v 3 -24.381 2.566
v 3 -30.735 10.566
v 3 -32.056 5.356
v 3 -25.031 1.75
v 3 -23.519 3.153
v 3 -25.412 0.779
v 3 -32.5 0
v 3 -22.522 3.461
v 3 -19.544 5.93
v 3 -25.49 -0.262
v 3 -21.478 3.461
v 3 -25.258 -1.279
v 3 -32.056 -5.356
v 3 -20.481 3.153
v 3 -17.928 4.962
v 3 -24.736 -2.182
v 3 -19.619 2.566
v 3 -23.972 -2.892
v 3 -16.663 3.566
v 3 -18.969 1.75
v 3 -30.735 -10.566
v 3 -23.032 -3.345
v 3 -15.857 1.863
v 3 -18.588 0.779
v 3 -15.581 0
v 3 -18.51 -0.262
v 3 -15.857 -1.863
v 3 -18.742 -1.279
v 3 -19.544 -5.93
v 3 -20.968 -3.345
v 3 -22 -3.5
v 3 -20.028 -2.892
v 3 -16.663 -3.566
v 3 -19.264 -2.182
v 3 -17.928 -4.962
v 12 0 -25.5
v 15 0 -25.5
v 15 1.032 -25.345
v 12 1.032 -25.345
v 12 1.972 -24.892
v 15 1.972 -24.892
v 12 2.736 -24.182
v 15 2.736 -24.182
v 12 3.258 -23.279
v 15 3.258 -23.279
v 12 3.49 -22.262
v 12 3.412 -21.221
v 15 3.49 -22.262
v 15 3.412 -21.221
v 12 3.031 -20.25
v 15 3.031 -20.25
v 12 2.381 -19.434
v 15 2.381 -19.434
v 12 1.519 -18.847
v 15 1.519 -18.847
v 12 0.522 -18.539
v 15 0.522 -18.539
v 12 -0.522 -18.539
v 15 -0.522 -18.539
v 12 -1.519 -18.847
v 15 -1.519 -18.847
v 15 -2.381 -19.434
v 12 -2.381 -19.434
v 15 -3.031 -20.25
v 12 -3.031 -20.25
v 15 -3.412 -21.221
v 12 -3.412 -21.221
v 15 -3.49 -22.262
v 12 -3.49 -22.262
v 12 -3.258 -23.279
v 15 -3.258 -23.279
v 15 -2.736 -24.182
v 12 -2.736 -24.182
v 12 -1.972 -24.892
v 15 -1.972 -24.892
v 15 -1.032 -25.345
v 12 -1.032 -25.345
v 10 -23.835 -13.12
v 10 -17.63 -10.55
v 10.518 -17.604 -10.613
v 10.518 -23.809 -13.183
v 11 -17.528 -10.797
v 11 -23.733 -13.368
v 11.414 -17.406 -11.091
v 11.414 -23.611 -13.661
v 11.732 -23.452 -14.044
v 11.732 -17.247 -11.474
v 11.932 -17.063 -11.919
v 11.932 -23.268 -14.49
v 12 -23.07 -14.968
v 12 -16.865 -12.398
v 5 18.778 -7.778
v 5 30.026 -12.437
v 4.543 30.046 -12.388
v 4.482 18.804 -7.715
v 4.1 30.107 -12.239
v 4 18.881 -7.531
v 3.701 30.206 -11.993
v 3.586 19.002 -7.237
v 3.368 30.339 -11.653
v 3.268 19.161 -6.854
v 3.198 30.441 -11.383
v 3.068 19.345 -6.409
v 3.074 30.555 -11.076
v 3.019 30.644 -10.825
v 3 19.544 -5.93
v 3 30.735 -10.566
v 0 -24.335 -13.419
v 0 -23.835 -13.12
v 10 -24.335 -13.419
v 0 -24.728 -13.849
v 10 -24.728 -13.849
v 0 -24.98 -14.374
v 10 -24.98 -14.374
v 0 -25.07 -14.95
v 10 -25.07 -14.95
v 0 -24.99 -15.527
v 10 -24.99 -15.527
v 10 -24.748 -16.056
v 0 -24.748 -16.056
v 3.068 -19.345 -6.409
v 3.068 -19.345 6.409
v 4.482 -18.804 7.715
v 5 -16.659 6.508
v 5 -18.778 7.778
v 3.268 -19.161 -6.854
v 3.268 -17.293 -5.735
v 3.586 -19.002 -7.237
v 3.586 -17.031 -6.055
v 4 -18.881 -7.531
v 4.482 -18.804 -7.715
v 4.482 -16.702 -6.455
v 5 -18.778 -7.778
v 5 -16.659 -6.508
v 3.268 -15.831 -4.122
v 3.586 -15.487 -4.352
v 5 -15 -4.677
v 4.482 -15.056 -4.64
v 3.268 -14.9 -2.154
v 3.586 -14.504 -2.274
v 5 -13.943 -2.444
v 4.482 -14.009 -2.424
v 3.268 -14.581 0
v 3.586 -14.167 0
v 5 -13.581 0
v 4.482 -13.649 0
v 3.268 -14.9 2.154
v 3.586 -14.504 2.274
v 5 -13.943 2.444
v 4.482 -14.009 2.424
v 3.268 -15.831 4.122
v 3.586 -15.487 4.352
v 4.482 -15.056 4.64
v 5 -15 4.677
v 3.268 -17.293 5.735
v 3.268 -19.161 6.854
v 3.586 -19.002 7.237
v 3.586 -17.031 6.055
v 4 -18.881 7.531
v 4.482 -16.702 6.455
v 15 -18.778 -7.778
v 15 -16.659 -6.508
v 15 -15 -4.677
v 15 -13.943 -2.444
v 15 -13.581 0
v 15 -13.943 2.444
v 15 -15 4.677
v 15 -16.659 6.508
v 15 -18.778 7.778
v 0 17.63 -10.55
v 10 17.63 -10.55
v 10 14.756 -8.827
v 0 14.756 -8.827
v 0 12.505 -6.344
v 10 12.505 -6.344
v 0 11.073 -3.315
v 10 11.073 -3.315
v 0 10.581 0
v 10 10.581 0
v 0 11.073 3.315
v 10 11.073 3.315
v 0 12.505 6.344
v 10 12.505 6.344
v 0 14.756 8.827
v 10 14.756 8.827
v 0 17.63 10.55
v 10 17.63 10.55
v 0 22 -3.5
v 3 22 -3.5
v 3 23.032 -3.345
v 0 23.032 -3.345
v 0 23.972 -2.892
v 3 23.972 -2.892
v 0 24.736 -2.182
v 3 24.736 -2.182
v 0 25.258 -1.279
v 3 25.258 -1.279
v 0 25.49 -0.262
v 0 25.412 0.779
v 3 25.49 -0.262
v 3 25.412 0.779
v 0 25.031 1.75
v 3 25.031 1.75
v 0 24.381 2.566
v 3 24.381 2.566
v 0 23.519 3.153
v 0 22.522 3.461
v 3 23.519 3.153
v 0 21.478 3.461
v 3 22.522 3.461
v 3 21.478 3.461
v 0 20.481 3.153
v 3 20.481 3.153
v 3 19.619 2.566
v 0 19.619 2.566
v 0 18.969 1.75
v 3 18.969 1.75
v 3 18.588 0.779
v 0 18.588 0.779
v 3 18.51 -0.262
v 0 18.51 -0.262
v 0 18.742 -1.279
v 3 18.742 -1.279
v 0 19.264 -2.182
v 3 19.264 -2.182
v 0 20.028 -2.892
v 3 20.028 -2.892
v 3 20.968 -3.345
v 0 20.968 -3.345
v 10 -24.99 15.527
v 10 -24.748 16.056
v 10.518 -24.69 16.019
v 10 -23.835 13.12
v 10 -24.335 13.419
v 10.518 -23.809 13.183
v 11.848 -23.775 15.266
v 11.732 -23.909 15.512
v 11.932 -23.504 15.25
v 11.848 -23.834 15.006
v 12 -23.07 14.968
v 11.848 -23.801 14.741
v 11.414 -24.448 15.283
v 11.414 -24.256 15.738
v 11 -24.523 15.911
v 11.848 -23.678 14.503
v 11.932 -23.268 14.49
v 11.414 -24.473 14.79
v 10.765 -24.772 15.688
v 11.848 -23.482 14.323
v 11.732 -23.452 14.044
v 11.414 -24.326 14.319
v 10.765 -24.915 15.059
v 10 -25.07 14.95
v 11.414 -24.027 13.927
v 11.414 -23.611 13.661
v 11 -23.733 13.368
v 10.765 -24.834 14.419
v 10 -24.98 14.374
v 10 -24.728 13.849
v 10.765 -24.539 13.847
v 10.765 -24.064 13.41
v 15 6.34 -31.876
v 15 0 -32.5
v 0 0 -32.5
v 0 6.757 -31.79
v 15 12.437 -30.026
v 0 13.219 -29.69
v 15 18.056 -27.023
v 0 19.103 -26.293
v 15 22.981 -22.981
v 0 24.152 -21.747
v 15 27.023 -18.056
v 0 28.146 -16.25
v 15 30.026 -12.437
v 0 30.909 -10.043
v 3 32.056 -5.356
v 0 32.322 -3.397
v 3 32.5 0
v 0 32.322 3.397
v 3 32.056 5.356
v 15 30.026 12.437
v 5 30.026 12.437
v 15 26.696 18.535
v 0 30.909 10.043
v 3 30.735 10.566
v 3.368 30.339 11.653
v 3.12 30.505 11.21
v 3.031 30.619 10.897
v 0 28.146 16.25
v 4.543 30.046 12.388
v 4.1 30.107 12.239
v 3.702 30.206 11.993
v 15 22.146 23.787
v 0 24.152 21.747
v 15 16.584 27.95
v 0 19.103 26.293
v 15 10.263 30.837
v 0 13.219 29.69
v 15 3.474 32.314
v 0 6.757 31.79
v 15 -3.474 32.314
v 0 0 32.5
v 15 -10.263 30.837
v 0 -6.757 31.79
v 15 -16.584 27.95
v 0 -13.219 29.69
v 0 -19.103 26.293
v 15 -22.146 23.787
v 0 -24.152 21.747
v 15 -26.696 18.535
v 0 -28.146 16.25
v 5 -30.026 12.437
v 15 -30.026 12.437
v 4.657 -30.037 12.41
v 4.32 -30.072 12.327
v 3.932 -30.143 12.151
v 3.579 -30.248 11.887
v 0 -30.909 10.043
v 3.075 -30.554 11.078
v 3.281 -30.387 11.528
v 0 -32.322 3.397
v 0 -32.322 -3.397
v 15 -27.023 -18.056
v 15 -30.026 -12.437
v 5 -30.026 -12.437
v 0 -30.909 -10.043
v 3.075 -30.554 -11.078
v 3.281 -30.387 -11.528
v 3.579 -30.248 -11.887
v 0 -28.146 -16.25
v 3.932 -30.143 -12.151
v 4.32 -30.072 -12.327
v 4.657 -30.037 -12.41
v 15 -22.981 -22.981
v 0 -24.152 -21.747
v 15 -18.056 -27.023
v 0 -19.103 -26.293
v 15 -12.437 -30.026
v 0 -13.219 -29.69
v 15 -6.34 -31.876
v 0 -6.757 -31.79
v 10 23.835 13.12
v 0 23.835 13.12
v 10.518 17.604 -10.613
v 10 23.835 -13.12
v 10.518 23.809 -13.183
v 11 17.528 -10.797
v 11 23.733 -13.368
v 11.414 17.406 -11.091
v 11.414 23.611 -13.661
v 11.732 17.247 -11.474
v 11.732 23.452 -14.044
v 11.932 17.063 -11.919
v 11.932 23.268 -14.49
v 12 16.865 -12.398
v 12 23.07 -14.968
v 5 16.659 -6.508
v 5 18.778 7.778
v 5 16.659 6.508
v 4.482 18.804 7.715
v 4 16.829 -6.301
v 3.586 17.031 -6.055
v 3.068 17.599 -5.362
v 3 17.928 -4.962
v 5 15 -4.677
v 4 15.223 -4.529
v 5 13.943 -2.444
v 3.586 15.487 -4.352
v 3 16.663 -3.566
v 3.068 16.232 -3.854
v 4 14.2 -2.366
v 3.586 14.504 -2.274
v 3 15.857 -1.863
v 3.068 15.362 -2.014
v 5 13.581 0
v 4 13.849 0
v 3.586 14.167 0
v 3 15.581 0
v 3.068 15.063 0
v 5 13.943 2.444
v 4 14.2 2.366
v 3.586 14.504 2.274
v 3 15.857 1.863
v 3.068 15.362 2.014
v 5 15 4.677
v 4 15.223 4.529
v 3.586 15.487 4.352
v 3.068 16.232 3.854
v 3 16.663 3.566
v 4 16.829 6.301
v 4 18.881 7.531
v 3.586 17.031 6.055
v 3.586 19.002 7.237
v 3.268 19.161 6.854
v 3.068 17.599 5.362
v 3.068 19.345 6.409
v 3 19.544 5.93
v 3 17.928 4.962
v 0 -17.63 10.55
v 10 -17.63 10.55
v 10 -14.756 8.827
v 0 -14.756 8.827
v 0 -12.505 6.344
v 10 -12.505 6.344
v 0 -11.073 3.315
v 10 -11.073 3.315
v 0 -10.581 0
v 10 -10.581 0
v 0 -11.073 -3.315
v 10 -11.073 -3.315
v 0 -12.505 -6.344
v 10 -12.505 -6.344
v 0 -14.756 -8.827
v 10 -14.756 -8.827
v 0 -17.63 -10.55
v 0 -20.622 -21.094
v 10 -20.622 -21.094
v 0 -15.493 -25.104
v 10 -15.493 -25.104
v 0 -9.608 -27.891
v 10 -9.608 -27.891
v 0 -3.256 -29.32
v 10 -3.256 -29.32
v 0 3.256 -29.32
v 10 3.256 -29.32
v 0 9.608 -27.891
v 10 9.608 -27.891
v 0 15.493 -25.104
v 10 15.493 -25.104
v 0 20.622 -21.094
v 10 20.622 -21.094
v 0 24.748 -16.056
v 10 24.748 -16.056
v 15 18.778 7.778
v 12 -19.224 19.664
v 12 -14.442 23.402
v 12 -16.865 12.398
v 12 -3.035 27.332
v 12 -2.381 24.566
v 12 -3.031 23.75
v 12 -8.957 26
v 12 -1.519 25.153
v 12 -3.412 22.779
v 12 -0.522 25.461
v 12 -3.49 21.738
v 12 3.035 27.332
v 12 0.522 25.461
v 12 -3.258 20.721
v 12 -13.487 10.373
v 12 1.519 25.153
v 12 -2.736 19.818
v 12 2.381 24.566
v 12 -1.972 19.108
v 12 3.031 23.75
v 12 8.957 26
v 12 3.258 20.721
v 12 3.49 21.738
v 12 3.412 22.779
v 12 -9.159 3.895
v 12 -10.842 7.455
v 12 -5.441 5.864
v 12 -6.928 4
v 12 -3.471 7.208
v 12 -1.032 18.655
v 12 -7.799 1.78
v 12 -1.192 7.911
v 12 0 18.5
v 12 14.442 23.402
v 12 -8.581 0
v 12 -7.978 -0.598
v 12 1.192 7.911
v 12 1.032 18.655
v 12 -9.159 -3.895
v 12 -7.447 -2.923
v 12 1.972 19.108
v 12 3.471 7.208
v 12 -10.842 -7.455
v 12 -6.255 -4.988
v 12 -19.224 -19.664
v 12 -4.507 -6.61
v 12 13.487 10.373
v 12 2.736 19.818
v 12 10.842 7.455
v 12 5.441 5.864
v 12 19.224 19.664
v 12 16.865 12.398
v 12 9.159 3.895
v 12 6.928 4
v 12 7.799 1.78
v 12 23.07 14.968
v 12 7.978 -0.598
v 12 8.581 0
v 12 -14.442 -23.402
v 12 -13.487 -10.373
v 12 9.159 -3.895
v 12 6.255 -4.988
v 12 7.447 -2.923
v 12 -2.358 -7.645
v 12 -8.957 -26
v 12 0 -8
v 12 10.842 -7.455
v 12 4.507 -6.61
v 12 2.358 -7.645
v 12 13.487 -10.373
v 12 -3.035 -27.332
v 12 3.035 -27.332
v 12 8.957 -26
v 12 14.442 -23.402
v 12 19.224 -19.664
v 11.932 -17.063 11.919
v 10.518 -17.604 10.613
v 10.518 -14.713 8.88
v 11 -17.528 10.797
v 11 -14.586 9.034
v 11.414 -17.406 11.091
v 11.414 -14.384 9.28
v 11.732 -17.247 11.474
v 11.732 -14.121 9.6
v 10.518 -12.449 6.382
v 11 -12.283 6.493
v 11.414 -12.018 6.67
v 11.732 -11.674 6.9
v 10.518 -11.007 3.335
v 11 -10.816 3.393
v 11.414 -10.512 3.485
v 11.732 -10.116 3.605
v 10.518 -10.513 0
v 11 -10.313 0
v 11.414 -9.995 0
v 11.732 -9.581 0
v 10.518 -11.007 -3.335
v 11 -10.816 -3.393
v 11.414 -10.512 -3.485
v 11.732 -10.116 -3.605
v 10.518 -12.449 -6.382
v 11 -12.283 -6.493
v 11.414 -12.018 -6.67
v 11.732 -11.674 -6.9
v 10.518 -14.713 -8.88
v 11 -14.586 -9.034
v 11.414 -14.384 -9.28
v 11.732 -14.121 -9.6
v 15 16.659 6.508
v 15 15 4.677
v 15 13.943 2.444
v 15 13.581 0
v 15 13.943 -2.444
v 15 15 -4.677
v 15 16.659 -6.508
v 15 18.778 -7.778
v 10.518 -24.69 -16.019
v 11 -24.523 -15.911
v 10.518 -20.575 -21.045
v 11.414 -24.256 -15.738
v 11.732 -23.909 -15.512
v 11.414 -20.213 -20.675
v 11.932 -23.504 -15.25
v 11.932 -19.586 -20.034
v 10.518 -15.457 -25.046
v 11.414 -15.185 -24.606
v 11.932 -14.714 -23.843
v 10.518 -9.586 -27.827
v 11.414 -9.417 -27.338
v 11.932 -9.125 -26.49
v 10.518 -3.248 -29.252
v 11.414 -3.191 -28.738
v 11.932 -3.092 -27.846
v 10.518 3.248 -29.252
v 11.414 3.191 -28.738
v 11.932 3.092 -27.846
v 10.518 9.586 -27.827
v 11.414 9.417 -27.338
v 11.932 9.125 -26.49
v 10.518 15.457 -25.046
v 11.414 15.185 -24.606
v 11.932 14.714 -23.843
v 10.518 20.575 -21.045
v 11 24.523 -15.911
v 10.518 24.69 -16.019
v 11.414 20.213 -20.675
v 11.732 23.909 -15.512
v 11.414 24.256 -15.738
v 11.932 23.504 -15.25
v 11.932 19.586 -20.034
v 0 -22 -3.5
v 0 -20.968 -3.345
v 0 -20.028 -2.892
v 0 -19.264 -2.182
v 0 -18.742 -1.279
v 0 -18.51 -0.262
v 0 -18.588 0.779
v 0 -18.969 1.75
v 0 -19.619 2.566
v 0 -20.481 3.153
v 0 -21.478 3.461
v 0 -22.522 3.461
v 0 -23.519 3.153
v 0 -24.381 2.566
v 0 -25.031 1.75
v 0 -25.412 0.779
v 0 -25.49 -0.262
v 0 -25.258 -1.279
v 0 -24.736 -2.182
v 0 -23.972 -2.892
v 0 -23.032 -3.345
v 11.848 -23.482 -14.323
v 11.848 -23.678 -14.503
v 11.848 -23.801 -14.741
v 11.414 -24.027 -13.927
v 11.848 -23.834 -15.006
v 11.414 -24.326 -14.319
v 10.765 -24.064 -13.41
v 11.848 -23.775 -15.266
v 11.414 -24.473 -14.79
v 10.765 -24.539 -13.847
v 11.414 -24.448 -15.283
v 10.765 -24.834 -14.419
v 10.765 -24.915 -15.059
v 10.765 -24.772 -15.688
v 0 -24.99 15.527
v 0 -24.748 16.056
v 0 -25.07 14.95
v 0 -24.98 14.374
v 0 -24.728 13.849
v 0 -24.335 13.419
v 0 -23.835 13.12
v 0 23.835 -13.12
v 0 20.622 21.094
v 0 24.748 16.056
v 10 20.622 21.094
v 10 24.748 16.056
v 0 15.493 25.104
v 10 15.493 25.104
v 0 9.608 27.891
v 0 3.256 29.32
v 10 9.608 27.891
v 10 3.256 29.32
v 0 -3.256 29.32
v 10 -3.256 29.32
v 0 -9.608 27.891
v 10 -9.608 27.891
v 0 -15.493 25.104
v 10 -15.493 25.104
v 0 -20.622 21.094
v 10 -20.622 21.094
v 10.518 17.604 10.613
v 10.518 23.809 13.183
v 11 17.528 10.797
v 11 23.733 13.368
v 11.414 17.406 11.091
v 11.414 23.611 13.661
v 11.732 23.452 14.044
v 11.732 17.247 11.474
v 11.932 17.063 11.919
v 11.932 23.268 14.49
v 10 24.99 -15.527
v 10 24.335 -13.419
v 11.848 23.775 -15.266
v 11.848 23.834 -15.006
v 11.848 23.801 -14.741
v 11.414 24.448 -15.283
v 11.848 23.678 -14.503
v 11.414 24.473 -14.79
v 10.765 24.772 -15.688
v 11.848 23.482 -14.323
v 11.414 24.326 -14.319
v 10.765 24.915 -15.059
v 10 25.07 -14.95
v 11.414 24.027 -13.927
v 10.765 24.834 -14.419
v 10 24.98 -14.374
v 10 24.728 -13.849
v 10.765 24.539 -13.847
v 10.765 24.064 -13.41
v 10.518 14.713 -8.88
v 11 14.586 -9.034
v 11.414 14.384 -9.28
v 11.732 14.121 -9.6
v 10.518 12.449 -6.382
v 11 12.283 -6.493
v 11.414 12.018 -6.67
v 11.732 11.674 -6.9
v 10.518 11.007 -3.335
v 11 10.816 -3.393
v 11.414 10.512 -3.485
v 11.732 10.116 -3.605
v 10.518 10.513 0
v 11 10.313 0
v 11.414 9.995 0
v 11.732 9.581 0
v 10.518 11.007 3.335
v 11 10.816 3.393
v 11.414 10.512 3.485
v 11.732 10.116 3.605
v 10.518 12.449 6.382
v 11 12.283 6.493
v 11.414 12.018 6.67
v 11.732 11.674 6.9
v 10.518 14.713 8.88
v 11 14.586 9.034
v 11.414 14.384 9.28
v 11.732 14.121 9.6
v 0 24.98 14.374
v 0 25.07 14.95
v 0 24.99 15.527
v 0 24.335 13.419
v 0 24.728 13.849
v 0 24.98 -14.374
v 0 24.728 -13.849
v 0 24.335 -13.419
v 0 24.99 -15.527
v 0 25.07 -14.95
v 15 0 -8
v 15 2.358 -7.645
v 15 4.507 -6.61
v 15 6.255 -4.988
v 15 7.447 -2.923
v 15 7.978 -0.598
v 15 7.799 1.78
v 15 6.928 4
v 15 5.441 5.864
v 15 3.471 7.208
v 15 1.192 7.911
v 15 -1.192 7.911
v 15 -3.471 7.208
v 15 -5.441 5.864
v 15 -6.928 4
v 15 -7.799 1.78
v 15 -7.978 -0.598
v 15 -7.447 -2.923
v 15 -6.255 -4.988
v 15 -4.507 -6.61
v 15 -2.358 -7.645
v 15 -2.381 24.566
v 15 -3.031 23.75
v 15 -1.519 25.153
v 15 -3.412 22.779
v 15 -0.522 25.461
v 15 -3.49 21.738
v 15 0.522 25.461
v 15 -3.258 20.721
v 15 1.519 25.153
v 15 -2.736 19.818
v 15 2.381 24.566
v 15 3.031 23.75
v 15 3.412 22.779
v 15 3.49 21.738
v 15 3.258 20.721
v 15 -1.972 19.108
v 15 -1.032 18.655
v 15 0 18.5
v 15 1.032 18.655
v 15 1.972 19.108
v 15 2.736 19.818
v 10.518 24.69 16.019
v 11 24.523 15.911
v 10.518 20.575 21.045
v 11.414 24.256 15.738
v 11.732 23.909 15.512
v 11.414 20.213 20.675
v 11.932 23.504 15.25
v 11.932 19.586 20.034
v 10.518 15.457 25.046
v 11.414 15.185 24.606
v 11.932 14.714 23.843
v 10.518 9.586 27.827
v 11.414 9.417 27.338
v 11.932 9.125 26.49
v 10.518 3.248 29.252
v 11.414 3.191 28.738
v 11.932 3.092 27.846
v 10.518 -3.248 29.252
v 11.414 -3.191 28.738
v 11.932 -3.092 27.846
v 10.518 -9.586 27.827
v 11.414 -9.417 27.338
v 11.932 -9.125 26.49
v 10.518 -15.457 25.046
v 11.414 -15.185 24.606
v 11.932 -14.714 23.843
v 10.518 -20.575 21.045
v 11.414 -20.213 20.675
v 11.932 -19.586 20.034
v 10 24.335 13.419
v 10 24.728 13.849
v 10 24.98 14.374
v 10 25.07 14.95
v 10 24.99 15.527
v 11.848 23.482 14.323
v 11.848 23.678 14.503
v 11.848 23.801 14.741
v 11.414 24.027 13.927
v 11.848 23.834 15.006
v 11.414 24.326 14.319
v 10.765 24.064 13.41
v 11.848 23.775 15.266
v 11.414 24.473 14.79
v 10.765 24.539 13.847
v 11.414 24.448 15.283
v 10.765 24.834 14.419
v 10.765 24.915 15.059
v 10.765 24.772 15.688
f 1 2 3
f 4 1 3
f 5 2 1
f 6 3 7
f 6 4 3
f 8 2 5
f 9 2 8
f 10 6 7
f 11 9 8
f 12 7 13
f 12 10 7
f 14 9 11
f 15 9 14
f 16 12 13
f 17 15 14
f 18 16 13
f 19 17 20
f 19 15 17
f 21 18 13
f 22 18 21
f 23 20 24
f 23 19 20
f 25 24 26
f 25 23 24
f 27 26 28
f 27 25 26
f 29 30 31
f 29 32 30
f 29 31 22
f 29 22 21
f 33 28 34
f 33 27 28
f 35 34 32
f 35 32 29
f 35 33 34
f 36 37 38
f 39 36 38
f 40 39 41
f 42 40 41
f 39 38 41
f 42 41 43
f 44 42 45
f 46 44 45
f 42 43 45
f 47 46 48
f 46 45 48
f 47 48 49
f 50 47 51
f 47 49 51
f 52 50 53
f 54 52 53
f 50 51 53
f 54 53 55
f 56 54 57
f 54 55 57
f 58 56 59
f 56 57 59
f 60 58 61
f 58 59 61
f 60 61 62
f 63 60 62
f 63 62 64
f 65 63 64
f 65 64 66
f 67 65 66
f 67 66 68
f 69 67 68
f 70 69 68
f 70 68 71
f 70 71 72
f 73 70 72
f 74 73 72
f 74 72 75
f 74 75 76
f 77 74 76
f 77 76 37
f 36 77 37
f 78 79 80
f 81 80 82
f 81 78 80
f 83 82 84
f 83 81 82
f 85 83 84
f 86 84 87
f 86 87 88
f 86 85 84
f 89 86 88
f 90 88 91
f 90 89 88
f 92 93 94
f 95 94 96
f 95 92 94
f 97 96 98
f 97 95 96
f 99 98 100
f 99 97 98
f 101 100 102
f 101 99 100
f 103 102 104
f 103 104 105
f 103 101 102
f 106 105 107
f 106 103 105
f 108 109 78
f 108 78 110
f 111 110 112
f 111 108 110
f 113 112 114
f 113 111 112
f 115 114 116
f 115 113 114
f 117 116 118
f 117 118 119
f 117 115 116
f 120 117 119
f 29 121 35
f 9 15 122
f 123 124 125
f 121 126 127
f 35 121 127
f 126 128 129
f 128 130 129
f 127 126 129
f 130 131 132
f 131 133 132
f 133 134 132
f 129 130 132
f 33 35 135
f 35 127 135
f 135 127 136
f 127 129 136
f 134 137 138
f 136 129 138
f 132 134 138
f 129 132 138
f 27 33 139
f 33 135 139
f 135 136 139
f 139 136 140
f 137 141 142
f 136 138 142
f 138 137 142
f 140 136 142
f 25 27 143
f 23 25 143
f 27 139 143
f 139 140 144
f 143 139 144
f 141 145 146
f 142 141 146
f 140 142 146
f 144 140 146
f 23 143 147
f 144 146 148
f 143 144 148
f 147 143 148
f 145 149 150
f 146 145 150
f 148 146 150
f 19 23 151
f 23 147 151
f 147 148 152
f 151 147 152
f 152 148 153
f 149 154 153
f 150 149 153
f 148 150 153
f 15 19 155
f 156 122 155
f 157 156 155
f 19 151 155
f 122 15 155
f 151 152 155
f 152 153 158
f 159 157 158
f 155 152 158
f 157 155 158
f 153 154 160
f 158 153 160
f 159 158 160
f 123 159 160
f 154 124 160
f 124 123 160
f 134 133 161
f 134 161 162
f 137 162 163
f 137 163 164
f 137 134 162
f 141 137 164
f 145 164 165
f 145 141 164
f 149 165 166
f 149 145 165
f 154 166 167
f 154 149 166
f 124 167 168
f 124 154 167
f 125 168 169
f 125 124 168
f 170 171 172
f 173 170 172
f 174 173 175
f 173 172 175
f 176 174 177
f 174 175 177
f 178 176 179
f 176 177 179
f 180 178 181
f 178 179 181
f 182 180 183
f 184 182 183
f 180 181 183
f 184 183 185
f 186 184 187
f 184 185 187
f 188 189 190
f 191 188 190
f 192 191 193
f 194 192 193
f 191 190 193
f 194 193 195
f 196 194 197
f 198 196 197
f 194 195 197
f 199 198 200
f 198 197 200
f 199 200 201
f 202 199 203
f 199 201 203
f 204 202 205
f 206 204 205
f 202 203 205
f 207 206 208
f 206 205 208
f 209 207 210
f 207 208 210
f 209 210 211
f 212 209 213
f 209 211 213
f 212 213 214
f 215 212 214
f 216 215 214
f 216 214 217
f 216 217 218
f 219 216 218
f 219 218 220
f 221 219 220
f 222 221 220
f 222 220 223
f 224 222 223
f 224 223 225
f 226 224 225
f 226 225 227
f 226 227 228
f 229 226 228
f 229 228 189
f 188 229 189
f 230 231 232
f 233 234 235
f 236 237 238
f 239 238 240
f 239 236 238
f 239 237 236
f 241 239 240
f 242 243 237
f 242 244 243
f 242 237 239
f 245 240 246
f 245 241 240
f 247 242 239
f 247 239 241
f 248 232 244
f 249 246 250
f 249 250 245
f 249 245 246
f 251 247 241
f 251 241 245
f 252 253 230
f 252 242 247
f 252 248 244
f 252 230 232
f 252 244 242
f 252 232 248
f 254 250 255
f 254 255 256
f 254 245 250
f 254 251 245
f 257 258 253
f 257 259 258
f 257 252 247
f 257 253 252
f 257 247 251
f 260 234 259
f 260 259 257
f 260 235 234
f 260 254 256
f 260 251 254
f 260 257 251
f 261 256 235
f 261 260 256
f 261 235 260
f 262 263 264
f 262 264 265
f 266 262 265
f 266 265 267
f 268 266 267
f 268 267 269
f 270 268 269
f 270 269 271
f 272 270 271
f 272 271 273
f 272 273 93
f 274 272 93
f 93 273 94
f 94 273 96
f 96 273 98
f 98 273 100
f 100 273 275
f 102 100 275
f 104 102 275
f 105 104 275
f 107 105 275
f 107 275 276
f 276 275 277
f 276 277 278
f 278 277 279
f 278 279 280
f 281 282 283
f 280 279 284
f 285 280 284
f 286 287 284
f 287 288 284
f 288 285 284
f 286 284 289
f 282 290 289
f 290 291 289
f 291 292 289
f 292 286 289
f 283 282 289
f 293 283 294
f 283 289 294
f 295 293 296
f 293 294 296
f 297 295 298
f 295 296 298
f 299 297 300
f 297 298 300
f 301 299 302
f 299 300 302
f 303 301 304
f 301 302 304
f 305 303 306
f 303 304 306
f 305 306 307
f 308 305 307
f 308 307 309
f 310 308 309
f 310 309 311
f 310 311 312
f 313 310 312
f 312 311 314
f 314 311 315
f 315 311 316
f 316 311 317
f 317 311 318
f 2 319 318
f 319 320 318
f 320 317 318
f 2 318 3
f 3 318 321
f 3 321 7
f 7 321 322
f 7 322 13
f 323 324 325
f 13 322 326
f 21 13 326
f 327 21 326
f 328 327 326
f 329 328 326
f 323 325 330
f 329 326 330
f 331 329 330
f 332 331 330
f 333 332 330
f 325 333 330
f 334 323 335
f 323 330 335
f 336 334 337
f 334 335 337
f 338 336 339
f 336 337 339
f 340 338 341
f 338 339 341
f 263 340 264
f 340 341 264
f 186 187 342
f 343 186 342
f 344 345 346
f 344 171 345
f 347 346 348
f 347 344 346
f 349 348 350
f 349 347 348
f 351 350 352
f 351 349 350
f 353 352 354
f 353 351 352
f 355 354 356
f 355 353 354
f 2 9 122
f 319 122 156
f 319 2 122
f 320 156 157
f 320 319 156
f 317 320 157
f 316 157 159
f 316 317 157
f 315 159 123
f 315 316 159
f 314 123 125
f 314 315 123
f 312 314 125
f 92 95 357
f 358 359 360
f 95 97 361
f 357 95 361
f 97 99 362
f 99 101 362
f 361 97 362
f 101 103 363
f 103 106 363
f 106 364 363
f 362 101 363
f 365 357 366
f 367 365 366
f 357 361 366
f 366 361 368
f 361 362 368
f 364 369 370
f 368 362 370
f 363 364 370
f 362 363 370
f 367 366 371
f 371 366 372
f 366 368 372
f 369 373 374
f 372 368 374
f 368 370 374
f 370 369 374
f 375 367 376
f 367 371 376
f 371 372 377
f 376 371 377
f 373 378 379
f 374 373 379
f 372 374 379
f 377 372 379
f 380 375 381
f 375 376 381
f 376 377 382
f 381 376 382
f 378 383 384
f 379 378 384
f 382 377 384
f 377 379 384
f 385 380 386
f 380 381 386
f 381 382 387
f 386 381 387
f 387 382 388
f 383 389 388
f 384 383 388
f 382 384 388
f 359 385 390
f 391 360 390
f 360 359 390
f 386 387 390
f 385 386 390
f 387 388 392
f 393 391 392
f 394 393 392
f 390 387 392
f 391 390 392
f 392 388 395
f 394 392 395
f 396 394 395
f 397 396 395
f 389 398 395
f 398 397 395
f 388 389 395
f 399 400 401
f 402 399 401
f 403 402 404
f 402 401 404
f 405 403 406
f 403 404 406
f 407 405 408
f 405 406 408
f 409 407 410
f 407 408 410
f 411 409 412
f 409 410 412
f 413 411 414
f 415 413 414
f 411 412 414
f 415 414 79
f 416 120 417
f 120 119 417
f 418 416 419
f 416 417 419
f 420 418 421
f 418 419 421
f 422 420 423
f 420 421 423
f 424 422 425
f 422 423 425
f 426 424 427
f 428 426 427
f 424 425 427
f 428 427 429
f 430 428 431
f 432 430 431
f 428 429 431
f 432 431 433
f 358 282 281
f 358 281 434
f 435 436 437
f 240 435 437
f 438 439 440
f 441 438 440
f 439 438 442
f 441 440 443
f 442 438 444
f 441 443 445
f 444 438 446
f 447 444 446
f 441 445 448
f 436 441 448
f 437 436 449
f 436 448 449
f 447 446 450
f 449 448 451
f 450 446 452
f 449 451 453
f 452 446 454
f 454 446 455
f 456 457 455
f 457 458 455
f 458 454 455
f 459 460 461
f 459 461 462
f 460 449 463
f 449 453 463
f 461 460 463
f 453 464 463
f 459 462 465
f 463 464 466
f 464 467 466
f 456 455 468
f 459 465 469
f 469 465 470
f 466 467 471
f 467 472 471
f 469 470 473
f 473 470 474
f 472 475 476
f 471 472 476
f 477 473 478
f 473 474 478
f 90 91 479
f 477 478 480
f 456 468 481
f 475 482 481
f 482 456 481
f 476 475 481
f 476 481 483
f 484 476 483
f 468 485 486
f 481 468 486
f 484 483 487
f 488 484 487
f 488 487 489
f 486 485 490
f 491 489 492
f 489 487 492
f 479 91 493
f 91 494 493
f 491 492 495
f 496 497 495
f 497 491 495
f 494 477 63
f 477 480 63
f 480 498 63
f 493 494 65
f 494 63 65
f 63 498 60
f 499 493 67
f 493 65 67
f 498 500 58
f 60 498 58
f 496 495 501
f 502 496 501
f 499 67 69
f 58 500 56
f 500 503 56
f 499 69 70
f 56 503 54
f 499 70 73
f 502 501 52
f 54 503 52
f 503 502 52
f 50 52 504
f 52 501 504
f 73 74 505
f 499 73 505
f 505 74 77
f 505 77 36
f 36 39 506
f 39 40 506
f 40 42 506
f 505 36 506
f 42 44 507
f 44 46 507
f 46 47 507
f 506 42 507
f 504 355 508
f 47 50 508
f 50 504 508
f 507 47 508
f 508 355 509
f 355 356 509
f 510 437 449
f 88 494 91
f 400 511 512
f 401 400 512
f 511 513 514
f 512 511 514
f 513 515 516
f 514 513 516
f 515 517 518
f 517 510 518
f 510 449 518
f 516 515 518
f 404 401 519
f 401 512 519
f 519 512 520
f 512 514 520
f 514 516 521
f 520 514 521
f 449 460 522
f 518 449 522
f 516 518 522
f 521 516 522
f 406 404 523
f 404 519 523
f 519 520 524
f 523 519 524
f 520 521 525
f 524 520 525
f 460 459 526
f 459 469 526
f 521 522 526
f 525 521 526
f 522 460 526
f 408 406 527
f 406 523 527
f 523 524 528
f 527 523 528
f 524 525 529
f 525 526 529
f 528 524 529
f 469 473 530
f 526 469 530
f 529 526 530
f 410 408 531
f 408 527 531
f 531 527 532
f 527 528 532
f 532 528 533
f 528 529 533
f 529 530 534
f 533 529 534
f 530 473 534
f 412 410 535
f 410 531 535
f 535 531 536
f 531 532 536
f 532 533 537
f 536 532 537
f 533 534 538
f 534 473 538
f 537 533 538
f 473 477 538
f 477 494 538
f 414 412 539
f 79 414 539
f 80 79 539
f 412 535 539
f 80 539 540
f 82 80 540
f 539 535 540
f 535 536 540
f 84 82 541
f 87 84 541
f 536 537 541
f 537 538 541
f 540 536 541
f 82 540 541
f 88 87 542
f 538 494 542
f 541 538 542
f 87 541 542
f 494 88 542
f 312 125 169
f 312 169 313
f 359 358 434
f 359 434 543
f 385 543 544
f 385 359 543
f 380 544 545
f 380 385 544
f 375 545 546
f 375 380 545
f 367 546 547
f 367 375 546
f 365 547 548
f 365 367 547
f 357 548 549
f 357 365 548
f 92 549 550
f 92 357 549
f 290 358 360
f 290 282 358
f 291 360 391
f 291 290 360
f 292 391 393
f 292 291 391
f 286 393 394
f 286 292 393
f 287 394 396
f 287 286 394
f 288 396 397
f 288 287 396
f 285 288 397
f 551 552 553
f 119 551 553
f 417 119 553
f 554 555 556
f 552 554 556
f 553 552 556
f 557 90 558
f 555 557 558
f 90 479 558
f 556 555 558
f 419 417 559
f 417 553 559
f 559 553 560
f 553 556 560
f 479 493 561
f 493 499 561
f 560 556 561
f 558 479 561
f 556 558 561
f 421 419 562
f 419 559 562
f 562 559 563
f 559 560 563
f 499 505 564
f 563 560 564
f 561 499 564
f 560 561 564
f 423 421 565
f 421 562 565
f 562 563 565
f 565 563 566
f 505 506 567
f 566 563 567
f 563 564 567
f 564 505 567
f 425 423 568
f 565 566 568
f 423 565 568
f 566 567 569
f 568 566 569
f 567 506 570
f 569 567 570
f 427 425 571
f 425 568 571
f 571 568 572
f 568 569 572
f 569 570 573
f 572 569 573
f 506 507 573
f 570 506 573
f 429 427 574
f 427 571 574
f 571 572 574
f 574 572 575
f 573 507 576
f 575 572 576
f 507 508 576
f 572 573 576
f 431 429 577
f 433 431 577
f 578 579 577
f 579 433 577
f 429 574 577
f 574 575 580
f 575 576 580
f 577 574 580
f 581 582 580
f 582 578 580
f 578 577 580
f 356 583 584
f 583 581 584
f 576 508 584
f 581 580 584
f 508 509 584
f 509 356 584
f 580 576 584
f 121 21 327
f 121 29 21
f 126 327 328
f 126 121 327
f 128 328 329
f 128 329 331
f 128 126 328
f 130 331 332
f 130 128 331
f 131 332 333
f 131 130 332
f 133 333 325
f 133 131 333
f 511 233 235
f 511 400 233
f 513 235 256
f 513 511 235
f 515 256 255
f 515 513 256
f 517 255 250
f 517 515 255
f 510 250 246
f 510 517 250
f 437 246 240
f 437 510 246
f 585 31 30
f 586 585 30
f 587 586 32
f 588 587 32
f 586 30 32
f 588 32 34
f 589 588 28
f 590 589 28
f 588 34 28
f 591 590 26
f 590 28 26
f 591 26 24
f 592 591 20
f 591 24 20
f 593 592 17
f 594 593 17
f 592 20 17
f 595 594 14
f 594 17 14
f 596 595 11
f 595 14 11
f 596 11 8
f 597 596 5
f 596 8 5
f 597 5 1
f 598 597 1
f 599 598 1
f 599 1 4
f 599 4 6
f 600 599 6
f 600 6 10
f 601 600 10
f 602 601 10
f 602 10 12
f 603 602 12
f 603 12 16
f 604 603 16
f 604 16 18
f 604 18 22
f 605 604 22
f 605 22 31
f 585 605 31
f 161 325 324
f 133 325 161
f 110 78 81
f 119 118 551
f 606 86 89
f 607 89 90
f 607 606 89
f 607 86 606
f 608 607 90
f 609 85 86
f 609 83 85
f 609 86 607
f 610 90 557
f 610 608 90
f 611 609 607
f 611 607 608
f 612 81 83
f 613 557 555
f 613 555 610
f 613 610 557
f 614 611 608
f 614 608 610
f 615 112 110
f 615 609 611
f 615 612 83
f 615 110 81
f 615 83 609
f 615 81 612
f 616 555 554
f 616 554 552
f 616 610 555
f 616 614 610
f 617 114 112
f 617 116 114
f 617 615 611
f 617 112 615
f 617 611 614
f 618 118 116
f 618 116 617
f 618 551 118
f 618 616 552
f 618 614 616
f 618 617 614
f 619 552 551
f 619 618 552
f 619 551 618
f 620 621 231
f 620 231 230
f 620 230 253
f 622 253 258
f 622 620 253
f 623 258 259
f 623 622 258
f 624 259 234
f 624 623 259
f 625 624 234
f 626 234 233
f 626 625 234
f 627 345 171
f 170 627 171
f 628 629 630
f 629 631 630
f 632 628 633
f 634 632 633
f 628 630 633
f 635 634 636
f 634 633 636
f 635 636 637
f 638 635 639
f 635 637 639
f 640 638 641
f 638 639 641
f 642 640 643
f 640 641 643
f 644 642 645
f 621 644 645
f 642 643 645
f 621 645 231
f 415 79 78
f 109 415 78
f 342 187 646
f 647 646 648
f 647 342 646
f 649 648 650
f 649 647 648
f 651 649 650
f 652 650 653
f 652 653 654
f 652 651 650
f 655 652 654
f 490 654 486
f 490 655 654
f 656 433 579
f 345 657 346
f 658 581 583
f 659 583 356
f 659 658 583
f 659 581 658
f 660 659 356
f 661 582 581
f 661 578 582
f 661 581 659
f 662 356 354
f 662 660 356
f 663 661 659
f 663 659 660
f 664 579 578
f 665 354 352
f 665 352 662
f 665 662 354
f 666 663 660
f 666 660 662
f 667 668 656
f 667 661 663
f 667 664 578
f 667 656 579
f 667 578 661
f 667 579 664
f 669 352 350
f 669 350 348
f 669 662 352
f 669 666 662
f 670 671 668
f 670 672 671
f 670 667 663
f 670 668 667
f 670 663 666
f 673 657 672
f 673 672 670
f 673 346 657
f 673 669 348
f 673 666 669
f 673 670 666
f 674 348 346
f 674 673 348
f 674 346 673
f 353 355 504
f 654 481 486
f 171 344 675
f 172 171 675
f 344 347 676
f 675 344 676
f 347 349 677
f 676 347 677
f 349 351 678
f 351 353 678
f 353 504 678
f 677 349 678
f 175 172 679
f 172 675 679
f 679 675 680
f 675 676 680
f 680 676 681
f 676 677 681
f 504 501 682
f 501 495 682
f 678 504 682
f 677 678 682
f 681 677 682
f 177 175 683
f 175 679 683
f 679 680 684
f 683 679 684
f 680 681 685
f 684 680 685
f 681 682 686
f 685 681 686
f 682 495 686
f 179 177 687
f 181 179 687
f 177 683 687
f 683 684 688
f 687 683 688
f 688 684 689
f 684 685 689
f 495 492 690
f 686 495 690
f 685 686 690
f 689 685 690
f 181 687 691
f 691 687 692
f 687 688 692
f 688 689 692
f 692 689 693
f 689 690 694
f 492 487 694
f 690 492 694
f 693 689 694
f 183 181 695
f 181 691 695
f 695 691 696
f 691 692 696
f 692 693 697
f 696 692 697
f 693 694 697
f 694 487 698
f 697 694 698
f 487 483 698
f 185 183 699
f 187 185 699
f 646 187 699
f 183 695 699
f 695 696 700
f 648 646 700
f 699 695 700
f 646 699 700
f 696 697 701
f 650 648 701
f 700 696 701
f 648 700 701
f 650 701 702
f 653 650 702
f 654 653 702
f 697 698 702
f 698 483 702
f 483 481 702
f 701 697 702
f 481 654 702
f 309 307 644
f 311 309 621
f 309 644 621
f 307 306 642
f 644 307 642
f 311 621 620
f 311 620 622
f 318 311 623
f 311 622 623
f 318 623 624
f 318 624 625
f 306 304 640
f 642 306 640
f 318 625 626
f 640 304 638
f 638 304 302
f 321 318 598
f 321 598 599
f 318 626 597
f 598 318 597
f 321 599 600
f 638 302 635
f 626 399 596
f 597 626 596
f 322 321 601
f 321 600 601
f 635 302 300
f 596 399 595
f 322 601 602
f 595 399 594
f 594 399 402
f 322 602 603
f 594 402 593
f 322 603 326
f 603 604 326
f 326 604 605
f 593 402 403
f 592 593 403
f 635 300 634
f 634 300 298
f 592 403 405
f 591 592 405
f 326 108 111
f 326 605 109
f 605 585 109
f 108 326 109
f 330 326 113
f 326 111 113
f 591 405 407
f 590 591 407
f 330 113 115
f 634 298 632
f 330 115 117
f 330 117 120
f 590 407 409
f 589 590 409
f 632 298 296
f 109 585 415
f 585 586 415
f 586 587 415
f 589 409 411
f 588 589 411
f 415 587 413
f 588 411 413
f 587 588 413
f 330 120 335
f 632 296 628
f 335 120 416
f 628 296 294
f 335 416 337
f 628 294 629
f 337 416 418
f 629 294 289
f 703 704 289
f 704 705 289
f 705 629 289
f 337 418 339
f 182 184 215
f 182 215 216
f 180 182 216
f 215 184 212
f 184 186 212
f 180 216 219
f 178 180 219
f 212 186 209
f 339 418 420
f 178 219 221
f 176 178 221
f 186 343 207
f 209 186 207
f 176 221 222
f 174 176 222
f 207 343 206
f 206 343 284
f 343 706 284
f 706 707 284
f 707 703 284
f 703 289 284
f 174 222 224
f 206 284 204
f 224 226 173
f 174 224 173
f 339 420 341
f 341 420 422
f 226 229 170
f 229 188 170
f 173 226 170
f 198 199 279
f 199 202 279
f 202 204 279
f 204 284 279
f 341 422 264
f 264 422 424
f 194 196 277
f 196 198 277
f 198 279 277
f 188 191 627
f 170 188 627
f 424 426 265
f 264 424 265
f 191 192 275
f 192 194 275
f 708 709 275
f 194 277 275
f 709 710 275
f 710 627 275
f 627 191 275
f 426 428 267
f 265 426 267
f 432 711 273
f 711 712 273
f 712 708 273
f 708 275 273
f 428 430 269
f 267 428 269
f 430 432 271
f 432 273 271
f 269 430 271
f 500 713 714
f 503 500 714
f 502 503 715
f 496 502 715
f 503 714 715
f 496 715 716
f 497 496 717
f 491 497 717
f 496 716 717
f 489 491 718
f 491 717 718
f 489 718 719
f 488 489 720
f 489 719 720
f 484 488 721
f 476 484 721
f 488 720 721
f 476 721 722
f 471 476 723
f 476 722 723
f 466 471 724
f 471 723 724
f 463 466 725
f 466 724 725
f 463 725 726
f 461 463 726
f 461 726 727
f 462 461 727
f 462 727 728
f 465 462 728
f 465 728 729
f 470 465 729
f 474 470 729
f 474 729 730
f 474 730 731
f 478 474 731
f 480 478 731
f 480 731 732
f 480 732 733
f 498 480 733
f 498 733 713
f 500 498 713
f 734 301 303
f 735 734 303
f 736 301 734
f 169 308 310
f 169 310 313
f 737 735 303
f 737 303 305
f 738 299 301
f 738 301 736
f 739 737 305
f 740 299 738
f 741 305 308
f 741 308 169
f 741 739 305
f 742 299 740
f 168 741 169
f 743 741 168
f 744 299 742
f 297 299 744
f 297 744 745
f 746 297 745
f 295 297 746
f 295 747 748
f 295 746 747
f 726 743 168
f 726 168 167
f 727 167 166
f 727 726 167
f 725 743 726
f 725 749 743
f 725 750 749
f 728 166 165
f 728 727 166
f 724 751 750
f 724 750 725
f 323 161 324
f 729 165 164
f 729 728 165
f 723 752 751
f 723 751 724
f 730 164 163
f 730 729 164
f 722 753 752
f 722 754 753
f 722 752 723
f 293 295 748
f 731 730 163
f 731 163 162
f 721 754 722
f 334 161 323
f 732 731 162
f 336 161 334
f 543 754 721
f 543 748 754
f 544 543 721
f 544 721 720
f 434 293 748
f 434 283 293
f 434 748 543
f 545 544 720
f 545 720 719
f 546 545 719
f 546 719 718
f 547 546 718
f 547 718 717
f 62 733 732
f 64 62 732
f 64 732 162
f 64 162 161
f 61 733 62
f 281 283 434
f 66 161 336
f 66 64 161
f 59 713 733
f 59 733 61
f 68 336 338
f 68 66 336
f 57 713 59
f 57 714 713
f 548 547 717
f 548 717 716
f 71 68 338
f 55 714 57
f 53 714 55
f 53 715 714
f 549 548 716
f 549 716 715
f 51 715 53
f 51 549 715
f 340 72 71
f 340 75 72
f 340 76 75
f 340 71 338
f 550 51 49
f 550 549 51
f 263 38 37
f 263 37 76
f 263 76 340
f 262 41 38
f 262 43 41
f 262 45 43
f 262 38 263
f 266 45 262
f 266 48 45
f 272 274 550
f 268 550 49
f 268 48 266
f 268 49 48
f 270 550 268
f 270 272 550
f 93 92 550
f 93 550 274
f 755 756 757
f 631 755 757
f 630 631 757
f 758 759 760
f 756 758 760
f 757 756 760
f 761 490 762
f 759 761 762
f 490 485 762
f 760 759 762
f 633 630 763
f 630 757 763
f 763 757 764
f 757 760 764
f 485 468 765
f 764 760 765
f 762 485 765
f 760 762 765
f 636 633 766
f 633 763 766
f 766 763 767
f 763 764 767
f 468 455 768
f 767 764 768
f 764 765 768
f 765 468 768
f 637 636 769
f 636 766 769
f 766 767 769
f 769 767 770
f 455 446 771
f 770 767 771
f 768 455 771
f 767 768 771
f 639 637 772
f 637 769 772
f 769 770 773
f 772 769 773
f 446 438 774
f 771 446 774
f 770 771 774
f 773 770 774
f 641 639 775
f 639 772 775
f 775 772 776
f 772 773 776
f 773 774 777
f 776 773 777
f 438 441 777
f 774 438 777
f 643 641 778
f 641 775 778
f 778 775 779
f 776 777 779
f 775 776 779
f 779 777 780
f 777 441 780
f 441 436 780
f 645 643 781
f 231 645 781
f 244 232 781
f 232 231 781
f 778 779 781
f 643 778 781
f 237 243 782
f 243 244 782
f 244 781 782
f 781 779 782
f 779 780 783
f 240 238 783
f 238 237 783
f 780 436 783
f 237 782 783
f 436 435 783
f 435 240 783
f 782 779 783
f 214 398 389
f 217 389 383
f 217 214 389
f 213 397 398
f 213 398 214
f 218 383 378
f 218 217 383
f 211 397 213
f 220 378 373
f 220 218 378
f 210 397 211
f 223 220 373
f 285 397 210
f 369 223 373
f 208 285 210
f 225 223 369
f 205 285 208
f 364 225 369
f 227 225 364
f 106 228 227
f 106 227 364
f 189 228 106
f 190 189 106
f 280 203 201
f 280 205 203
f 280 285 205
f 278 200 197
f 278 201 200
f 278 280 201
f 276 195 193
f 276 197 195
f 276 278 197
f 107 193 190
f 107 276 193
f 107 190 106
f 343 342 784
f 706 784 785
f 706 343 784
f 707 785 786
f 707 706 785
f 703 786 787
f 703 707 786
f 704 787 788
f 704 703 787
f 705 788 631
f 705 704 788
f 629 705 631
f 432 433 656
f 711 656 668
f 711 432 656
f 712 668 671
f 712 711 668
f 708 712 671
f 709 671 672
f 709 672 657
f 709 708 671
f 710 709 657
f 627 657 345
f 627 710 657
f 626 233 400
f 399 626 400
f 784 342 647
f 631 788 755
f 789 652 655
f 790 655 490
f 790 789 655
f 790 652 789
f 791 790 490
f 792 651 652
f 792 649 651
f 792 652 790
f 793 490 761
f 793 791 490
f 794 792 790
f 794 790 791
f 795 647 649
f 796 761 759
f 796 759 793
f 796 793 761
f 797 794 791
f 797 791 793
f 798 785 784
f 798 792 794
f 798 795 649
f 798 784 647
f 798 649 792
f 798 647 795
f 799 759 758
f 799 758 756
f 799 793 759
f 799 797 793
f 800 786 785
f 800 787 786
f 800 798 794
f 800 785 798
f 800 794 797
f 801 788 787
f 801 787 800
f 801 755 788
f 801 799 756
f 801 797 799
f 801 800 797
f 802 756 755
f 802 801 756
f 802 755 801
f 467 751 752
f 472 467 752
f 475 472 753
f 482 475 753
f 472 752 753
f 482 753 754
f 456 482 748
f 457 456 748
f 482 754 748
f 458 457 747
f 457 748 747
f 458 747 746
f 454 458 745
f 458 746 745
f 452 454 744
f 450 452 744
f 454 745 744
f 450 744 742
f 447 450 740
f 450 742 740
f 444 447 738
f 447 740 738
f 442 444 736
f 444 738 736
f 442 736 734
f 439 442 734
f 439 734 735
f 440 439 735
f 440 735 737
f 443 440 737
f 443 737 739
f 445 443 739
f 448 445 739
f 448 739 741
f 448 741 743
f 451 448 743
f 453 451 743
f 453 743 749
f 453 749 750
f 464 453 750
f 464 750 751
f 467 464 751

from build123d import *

# Parameters (mm, degrees)
SKETCH1_R           = 32.5
BOSS_EXTRUDE1_DEPTH = 15
CUT_EXTRUDE1_START  = -12
SKETCH2_R           = 3.4999999999999996
CUT_EXTRUDE1_DEPTH  = 12
SKETCH2_3_R         = 3.4999999999999996
SKETCH2_3_R_2       = 3.5
SKETCH2_3_R_3       = 8
CUT_EXTRUDE2_DEPTH  = 49.34769901453429
CUT_EXTRUDE3_START  = -3
SKETCH2_4_R         = 3.5
SKETCH2_4_R_2       = 8
CUT_EXTRUDE3_DEPTH  = 12
FILLET1_R           = 2
FILLET2_R           = 2


with BuildPart() as part:
    # Sketch1 → Boss-Extrude1 (new body)
    with BuildSketch(Plane(origin=(0, 0, 0), x_dir=(0, 0, -1), z_dir=(1, 0, 0))):
        Circle(SKETCH1_R)
    extrude(amount=BOSS_EXTRUDE1_DEPTH)

    # Sketch2 → Cut-Extrude1 (cut)
    # profile 1 of 4: a face of its own
    with BuildSketch(Plane(origin=(15, 0, 0), x_dir=(0, 0, -1), z_dir=(1, 0, 0)).offset(CUT_EXTRUDE1_START)):
        with BuildLine():
            ThreePointArc((12.437211551865326, 30.026084806616858), (1.99e-15, 32.5), (-12.43721155186533, 30.026084806616854))
            Line((-12.437211551865326, 30.02608480661686), (-11.289161254770068, 27.254446209083))
            ThreePointArc((-11.289161254770706, 27.254446209082737), (-1.129e-14, 29.500000000000007), (11.28916125477069, 27.254446209082744))
            Line((11.289161254770068, 27.254446209083), (12.437211551865326, 30.02608480661686))
        make_face()
    # profile 2 of 4: a face of its own
    with BuildSketch(Plane(origin=(15, 0, 0), x_dir=(0, 0, -1), z_dir=(1, 0, 0)).offset(CUT_EXTRUDE1_START)):
        with BuildLine():
            ThreePointArc((11.28916125477069, 27.254446209082744), (-1.129e-14, 29.500000000000007), (-11.289161254770706, 27.254446209082737))
            Line((-11.289161254770068, 27.254446209083), (-7.778174593051978, 18.778174593052064))
            ThreePointArc((-7.778174593051979, 18.778174593052064), (4.4e-16, 13.580964487968082), (7.778174593051979, 18.778174593052064))
            Line((7.778174593051979, 18.778174593052064), (11.289161254770068, 27.254446209083))
        make_face()
        with Locations((0, 22)):
            Circle(SKETCH2_R, mode=Mode.SUBTRACT)
    # profile 3 of 4: a face of its own
    with BuildSketch(Plane(origin=(15, 0, 0), x_dir=(0, 0, -1), z_dir=(1, 0, 0)).offset(CUT_EXTRUDE1_START)):
        with BuildLine():
            Line((-7.778174593051979, -18.778174593052064), (-11.289161254770068, -27.254446209083))
            ThreePointArc((-11.2891612547707, -27.25444620908274), (-5.42e-15, -29.500000000000007), (11.28916125477069, -27.254446209082744))
            Line((11.289161254770068, -27.254446209083), (7.778174593051979, -18.778174593052064))
            ThreePointArc((7.778174593051979, -18.778174593052064), (4.4e-16, -13.580964487968082), (-7.778174593051979, -18.778174593052064))
        make_face()
        with Locations((-1.5363e-13, -22)):
            Circle(SKETCH2_R, mode=Mode.SUBTRACT)
    # profile 4 of 4: a face of its own
    with BuildSketch(Plane(origin=(15, 0, 0), x_dir=(0, 0, -1), z_dir=(1, 0, 0)).offset(CUT_EXTRUDE1_START)):
        with BuildLine():
            Line((-11.289161254770068, -27.254446209083), (-12.437211551865326, -30.02608480661686))
            ThreePointArc((-12.43721155186533, -30.026084806616854), (-5.97e-15, -32.5), (12.43721155186532, -30.02608480661686))
            Line((12.437211551865326, -30.02608480661686), (11.289161254770068, -27.254446209083))
            ThreePointArc((11.28916125477069, -27.254446209082744), (-5.42e-15, -29.500000000000007), (-11.2891612547707, -27.25444620908274))
        make_face()
    extrude(amount=CUT_EXTRUDE1_DEPTH, mode=Mode.SUBTRACT)

    # Sketch2<3> → Cut-Extrude2 (cut, through all)
    with BuildSketch(Plane(origin=(15, 0, 0), x_dir=(0, 0, -1), z_dir=(1, 0, 0))):
        with Locations((0, 22)):
            Circle(SKETCH2_3_R)
        with Locations((-1.5363e-13, -22)):
            Circle(SKETCH2_3_R)
        with Locations((-21.999999999999996, 2.3044e-13)):
            Circle(SKETCH2_3_R_2)
        with Locations((22, -7.681e-14)):
            Circle(SKETCH2_3_R_2)
        Circle(SKETCH2_3_R_3)
    extrude(amount=-CUT_EXTRUDE2_DEPTH, mode=Mode.SUBTRACT)

    # Sketch2<4> → Cut-Extrude3 (cut)
    with BuildSketch(Plane(origin=(15, 0, 0), x_dir=(0, 0, -1), z_dir=(1, 0, 0)).offset(CUT_EXTRUDE3_START)):
        with BuildLine():
            Line((-10.549813190585843, 17.630124295956804), (-14.002272700359098, 25.96509886799544))
            ThreePointArc((-14.002272700359109, 25.965098867995447), (-29.500000000000007, 3.61e-15), (-14.002272700359114, -25.965098867995444))
            Line((-14.0022727003591, -25.96509886799545), (-10.549813190585835, -17.630124295956804))
            ThreePointArc((-10.549813190585837, -17.630124295956804), (1.78e-15, -10.580964487968227), (10.549813190585844, -17.6301242959568))
            Line((10.549813190585843, -17.6301242959568), (14.0022727003591, -25.96509886799545))
            ThreePointArc((14.002272700359107, -25.965098867995447), (25.33097949804344, -15.119241967430227), (29.500000000000007, -7.23e-15))
            ThreePointArc((29.500000000000007, 0), (25.33097949804344, 15.119241967430227), (14.0022727003591, 25.96509886799545))
            Line((14.002272700359098, 25.96509886799544), (10.549813190585843, 17.630124295956804))
            ThreePointArc((10.549813190585843, 17.6301242959568), (-1.78e-15, 10.58096448796808), (-10.549813190585843, 17.630124295956804))
        make_face()
        with Locations((22, -7.681e-14)):
            Circle(SKETCH2_4_R, mode=Mode.SUBTRACT)
        with Locations((-21.999999999999996, 2.3044e-13)):
            Circle(SKETCH2_4_R, mode=Mode.SUBTRACT)
        Circle(SKETCH2_4_R_2, mode=Mode.SUBTRACT)
    extrude(amount=-CUT_EXTRUDE3_DEPTH, mode=Mode.SUBTRACT)

    # Fillet1
    fillet1_edges = [part.edges().sort_by_distance(p)[0] for p in [
        (6, -25.96509886799545, -14.002272700359104),
        (12, -10.580964487968227, -1.78e-15),
        (6, -25.965098867995447, 14.00227270035911),
        (6, 25.965098867995444, 14.002272700359104),
        (12, 21.79761158197612, 12.27604294547247),
        (12, 10.580964487968078, 3.11e-15),
        (12, 21.79761158197612, -12.27604294547247),
        (6, 25.965098867995444, -14.0022727003591),
        (12, 7.11e-15, 29.5),
        (12, -21.797611581976128, 12.276042945472469),
        (12, -21.797611581976128, -12.276042945472472),
        (12, -3.11e-15, -29.500000000000007),
    ]]
    fillet(fillet1_edges, radius=FILLET1_R)

    # Fillet2
    fillet2_edges = [part.edges().sort_by_distance(p)[0] for p in [
        (3, 24.40212969983446, 10.107693072458654),
        (3, 24.402129699834465, -10.107693072458654),
        (3, 13.580964487968082, -8.9e-16),
        (3, -24.40212969983446, 10.107693072458654),
        (3, -13.580964487968082, 8.9e-16),
        (3, -24.402129699834465, -10.107693072458652),
    ]]
    fillet(fillet2_edges, radius=FILLET2_R)


solid = part.part
